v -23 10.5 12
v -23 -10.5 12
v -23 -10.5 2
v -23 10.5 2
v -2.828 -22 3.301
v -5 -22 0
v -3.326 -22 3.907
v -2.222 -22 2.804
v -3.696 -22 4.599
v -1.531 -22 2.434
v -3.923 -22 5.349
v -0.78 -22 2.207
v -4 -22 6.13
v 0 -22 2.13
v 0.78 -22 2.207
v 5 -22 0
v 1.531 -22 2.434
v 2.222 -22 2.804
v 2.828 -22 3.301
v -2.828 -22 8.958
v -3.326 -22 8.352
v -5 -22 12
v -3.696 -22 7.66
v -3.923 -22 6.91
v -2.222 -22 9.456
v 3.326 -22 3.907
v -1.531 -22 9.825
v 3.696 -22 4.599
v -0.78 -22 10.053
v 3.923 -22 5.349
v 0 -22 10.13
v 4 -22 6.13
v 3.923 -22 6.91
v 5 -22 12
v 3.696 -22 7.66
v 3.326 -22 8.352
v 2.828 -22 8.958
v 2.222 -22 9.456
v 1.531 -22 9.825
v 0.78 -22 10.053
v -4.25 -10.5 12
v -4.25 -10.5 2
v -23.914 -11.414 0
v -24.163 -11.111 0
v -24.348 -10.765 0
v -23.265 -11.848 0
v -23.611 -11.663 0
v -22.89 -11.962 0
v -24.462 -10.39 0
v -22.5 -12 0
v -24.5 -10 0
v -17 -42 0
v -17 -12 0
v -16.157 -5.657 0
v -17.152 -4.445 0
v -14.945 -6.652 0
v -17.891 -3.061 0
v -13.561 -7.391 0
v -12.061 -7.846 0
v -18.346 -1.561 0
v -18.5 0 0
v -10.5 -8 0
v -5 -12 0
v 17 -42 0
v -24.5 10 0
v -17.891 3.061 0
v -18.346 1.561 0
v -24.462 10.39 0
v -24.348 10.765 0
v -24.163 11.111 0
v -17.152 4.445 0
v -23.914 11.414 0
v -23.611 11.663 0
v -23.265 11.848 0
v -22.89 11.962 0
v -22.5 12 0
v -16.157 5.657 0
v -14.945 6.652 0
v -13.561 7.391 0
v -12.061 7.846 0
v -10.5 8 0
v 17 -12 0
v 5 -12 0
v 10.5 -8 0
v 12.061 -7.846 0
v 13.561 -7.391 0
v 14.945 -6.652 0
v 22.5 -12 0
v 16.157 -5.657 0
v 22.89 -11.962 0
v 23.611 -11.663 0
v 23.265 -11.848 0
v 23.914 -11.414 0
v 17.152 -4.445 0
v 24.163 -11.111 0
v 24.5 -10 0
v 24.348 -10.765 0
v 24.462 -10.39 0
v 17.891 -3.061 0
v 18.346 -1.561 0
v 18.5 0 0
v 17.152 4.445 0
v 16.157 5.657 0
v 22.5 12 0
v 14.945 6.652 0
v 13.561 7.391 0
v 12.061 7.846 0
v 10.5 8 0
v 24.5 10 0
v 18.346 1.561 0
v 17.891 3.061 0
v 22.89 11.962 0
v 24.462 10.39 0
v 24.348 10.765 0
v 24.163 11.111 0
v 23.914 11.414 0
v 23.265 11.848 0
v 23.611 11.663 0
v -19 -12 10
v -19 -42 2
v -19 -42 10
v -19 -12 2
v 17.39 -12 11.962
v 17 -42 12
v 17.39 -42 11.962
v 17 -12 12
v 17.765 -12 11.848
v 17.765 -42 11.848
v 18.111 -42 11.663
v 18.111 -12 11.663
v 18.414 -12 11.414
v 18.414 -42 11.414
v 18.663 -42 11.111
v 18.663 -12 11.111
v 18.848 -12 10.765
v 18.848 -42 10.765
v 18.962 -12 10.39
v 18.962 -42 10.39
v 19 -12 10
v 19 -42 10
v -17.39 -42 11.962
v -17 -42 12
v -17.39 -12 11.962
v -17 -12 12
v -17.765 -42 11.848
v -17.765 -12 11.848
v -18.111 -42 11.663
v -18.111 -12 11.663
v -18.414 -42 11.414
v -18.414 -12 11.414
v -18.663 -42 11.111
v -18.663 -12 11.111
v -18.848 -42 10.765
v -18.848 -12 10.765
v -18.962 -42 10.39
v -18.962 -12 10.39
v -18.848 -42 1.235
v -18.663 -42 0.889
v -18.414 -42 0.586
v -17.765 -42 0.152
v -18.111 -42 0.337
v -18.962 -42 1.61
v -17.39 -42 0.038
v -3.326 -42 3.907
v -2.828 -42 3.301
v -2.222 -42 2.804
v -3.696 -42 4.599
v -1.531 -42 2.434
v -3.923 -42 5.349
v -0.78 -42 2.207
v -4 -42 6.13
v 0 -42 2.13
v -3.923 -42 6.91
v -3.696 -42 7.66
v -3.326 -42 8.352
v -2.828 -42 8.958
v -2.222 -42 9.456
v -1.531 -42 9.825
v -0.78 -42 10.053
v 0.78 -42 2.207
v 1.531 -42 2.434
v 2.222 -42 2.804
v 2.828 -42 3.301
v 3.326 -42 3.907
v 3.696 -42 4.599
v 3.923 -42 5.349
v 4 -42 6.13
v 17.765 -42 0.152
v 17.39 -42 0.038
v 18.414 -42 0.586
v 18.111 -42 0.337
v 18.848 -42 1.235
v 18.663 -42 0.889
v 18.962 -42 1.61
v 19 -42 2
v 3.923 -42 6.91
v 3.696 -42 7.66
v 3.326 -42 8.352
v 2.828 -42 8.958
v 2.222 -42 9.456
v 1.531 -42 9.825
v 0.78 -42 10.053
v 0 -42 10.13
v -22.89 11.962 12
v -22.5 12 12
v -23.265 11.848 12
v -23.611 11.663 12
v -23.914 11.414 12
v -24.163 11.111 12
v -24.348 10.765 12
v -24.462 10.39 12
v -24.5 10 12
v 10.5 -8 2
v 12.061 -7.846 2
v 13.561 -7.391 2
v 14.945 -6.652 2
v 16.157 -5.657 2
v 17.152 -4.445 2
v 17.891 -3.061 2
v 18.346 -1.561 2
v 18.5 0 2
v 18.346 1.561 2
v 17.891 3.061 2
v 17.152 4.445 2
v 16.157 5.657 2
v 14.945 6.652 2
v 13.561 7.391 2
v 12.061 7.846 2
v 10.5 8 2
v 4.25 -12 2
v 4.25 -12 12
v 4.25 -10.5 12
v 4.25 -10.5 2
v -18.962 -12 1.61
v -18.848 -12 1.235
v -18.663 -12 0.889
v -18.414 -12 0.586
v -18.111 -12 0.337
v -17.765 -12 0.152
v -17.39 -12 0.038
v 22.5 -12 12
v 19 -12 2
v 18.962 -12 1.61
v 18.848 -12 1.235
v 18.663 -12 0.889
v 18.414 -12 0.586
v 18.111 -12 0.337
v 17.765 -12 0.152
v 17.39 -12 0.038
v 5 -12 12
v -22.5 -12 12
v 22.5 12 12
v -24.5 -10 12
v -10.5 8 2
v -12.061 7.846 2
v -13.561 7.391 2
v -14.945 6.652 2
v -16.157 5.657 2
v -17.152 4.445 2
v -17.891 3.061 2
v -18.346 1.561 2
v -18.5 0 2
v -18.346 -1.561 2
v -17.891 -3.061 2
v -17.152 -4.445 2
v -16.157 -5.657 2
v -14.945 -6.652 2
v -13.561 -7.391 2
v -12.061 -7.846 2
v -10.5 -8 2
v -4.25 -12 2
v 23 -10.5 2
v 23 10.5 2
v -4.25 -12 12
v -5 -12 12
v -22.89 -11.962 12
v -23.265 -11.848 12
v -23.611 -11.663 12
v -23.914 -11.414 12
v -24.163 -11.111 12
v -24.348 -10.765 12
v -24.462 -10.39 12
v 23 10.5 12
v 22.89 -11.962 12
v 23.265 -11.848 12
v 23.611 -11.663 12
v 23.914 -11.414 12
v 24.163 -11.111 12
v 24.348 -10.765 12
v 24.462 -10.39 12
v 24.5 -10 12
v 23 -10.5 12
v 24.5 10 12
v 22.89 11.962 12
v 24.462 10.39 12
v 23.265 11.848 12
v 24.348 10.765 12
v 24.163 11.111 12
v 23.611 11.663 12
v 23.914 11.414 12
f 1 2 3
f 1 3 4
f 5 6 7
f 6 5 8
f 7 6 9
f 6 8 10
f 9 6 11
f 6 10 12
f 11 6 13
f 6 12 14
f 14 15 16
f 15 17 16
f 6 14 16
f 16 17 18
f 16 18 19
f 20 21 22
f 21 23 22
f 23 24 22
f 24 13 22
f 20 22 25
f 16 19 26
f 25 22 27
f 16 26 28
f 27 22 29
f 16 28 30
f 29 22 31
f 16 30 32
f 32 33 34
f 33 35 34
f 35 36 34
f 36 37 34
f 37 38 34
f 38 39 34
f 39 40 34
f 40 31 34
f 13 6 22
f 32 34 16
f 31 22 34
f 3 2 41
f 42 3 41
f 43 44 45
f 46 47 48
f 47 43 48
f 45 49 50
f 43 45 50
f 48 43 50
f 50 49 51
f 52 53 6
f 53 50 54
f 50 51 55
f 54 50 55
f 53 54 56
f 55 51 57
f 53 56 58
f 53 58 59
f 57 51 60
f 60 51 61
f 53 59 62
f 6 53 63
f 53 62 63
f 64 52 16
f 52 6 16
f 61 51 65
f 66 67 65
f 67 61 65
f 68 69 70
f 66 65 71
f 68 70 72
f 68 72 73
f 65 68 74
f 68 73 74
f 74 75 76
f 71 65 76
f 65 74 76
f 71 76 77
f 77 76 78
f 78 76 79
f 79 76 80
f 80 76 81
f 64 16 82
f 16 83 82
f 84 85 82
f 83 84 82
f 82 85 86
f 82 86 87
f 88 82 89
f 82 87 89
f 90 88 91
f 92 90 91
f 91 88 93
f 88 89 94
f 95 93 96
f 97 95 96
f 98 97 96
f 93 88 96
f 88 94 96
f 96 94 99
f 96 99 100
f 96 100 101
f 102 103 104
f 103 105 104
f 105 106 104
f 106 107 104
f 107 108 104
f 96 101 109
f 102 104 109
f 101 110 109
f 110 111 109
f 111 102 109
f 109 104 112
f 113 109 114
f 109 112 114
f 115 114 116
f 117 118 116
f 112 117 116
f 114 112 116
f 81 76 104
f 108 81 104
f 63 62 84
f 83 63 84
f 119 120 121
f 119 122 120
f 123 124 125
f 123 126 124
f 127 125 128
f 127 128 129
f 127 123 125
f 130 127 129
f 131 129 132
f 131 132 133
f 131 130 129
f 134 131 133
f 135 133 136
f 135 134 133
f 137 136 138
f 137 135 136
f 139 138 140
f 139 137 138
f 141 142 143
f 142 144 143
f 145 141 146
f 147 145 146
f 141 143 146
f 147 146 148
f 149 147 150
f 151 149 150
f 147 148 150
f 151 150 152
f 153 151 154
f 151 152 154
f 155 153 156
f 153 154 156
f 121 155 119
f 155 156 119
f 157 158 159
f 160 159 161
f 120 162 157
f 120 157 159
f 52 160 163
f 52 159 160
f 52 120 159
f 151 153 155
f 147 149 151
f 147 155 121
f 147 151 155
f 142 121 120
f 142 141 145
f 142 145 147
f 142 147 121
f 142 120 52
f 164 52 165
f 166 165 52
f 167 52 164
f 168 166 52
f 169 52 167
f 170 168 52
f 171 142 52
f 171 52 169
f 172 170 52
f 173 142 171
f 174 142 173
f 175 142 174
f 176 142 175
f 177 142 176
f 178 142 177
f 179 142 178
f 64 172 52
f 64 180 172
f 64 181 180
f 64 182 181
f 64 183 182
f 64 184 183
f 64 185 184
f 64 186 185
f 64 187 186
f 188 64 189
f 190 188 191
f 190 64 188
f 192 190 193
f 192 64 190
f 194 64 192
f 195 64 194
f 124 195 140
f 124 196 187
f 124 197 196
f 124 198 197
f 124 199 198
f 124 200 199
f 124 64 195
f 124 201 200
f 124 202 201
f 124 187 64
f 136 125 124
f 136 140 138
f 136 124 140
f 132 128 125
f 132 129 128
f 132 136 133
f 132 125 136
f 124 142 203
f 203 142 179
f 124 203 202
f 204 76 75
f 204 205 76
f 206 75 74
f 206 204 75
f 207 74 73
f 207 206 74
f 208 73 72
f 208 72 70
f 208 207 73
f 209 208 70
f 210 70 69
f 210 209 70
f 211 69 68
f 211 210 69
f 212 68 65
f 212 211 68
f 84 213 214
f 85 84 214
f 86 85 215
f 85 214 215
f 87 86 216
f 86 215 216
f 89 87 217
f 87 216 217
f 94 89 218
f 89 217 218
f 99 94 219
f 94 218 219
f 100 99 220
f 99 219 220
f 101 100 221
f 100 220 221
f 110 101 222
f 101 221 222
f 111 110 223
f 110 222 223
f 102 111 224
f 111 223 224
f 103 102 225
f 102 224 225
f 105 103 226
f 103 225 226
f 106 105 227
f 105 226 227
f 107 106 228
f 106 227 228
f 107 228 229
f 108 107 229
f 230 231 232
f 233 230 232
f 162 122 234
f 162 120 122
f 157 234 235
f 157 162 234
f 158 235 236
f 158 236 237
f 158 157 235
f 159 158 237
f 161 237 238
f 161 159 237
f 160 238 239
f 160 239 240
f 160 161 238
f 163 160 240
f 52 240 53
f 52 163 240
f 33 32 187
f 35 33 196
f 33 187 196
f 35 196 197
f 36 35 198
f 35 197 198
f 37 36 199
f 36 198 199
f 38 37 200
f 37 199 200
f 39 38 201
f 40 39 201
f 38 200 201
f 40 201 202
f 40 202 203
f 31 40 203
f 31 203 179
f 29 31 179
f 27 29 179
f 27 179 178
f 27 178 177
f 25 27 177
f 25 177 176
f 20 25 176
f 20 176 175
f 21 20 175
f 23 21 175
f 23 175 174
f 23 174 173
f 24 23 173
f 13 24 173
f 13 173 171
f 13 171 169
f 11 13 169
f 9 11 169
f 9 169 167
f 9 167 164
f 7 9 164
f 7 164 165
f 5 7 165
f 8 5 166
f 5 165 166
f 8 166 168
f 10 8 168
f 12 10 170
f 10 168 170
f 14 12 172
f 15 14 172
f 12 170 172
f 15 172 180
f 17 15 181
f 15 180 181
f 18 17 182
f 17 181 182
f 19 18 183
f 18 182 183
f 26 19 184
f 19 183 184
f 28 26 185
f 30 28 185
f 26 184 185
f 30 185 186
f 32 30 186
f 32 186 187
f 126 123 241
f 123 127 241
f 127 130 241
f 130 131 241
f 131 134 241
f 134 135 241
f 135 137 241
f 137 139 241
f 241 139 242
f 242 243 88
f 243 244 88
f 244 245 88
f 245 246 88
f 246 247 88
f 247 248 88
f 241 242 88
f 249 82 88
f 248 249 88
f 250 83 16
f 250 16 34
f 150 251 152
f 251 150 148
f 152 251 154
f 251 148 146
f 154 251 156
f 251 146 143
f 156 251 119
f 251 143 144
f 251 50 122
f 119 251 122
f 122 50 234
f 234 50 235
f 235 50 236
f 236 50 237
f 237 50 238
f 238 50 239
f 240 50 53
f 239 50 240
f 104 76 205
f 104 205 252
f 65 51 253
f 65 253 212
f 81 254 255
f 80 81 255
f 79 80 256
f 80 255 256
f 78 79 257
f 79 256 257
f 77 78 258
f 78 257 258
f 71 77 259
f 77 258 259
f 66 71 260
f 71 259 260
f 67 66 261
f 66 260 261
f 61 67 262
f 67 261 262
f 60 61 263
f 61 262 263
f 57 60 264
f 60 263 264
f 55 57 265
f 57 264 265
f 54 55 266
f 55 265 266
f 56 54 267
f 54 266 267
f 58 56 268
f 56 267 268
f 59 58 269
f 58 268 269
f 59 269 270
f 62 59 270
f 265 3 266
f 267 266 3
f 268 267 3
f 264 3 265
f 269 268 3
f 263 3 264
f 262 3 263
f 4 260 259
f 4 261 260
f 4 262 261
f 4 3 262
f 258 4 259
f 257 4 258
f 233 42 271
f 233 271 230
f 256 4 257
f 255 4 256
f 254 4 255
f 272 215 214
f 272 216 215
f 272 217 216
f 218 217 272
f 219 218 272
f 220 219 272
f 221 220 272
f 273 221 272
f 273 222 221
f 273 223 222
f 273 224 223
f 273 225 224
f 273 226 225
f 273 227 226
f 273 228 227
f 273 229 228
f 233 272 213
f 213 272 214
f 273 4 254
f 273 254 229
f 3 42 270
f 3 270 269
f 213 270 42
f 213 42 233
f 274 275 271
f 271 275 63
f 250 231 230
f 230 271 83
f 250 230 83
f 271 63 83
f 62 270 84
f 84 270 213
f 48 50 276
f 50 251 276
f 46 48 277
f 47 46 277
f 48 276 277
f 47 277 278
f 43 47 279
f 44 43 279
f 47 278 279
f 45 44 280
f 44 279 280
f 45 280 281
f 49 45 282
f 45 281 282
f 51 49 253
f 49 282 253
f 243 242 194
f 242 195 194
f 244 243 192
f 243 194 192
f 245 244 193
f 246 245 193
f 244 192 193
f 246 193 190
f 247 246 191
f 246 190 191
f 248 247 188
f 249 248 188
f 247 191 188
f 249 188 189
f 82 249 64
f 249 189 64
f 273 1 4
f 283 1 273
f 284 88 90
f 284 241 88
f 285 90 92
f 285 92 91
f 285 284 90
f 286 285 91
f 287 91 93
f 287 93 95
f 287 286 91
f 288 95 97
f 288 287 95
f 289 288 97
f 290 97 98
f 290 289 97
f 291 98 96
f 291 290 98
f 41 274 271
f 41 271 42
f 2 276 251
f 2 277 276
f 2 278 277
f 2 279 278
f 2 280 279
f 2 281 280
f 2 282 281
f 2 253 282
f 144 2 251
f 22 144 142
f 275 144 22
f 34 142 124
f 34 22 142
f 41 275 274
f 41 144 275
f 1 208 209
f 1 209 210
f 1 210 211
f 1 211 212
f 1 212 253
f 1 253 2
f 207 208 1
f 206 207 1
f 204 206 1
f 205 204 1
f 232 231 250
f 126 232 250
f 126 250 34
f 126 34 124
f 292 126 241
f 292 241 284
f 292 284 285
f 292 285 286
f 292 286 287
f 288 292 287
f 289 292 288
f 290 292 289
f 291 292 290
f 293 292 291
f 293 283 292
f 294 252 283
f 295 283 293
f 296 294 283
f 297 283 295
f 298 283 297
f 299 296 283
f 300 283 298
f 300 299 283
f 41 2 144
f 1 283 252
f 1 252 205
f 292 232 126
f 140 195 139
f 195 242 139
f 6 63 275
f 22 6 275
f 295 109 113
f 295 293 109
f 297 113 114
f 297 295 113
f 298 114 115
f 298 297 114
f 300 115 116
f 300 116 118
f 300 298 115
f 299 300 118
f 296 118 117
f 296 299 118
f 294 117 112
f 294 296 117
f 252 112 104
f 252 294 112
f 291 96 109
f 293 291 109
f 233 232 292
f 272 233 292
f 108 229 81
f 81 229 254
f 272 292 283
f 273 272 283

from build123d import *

# Parameters (mm, degrees)
SKETCH_W        = 49
SKETCH_H        = 24
PAD_DEPTH       = 12
POCKET_DEPTH    = 12.001
SKETCH002_W     = 46
SKETCH002_H     = 21
POCKET001_DEPTH = 10
SKETCH003_W     = 8.5
SKETCH003_H     = 9.019632
POCKET002_DEPTH = 10
SKETCH004_W     = 14
SKETCH004_H     = 12
PAD001_DEPTH    = 10
SKETCH005_W     = 38
SKETCH005_H     = 12
PAD002_DEPTH    = 20
SKETCH006_R     = 4
POCKET003_DEPTH = 21
FILLET_R        = 2
FILLET001_R     = 2


with BuildPart() as part:
    # Sketch → Pad (new body)
    with BuildSketch(Plane.XY):
        Rectangle(SKETCH_W, SKETCH_H)
    extrude(amount=PAD_DEPTH)

    # Sketch001 (on Face6 of Pad) → Pocket (cut, through all)
    with BuildSketch(Plane.XY.offset(12)):
        with BuildLine():
            ThreePointArc((-10.5, 8), (-18.5, 0), (-10.5, -8))
            Line((-10.5, -8), (10.5, -8))
            ThreePointArc((10.5, -8), (18.5, 0), (10.5, 8))
            Line((10.5, 8), (-10.5, 8))
        make_face()
    extrude(amount=-POCKET_DEPTH, mode=Mode.SUBTRACT)

    # Sketch002 (on Face5 of Pocket) → Pocket001 (cut)
    with BuildSketch(Plane.XY.offset(12)):
        Rectangle(SKETCH002_W, SKETCH002_H)
    extrude(amount=-POCKET001_DEPTH, mode=Mode.SUBTRACT)

    # Sketch003 (on Face5 of Pocket001) → Pocket002 (cut)
    with BuildSketch(Plane.XY.offset(12)):
        with Locations((0, -11.77937)):
            Rectangle(SKETCH003_W, SKETCH003_H)
    extrude(amount=-POCKET002_DEPTH, mode=Mode.SUBTRACT)

    # Sketch004 (on Face6 of Pocket002) → Pad001 (join)
    with BuildSketch(Plane.XZ.offset(12)):
        with Locations((-12, 6)):
            Rectangle(SKETCH004_W, SKETCH004_H)
        with Locations((12, 6)):
            Rectangle(SKETCH004_W, SKETCH004_H)
    extrude(amount=PAD001_DEPTH)

    # Sketch005 (on Face30 of Pad001) → Pad002 (join)
    with BuildSketch(Plane.XZ.offset(22)):
        with Locations((0, 6)):
            Rectangle(SKETCH005_W, SKETCH005_H)
    extrude(amount=PAD002_DEPTH)

    # Sketch006 (on Face36 of Pad002) → Pocket003 (cut)
    with BuildSketch(Plane.XZ.offset(42)):
        with Locations((0, 6.129715)):
            Circle(SKETCH006_R)
    extrude(amount=-POCKET003_DEPTH, mode=Mode.SUBTRACT)

    # Fillet
    fillet_edges = [part.edges().sort_by_distance(p)[0] for p in [
        (24.5, -12, 6),
        (24.5, 12, 6),
        (-24.5, 12, 6),
        (-24.5, -12, 6),
    ]]
    fillet(fillet_edges, radius=FILLET_R)

    # Fillet001
    fillet001_edges = [part.edges().sort_by_distance(p)[0] for p in [
        (19, -32, 0),
        (-19, -32, 0),
        (19, -32, 12),
        (-19, -32, 12),
    ]]
    fillet(fillet001_edges, radius=FILLET001_R)


solid = part.part
